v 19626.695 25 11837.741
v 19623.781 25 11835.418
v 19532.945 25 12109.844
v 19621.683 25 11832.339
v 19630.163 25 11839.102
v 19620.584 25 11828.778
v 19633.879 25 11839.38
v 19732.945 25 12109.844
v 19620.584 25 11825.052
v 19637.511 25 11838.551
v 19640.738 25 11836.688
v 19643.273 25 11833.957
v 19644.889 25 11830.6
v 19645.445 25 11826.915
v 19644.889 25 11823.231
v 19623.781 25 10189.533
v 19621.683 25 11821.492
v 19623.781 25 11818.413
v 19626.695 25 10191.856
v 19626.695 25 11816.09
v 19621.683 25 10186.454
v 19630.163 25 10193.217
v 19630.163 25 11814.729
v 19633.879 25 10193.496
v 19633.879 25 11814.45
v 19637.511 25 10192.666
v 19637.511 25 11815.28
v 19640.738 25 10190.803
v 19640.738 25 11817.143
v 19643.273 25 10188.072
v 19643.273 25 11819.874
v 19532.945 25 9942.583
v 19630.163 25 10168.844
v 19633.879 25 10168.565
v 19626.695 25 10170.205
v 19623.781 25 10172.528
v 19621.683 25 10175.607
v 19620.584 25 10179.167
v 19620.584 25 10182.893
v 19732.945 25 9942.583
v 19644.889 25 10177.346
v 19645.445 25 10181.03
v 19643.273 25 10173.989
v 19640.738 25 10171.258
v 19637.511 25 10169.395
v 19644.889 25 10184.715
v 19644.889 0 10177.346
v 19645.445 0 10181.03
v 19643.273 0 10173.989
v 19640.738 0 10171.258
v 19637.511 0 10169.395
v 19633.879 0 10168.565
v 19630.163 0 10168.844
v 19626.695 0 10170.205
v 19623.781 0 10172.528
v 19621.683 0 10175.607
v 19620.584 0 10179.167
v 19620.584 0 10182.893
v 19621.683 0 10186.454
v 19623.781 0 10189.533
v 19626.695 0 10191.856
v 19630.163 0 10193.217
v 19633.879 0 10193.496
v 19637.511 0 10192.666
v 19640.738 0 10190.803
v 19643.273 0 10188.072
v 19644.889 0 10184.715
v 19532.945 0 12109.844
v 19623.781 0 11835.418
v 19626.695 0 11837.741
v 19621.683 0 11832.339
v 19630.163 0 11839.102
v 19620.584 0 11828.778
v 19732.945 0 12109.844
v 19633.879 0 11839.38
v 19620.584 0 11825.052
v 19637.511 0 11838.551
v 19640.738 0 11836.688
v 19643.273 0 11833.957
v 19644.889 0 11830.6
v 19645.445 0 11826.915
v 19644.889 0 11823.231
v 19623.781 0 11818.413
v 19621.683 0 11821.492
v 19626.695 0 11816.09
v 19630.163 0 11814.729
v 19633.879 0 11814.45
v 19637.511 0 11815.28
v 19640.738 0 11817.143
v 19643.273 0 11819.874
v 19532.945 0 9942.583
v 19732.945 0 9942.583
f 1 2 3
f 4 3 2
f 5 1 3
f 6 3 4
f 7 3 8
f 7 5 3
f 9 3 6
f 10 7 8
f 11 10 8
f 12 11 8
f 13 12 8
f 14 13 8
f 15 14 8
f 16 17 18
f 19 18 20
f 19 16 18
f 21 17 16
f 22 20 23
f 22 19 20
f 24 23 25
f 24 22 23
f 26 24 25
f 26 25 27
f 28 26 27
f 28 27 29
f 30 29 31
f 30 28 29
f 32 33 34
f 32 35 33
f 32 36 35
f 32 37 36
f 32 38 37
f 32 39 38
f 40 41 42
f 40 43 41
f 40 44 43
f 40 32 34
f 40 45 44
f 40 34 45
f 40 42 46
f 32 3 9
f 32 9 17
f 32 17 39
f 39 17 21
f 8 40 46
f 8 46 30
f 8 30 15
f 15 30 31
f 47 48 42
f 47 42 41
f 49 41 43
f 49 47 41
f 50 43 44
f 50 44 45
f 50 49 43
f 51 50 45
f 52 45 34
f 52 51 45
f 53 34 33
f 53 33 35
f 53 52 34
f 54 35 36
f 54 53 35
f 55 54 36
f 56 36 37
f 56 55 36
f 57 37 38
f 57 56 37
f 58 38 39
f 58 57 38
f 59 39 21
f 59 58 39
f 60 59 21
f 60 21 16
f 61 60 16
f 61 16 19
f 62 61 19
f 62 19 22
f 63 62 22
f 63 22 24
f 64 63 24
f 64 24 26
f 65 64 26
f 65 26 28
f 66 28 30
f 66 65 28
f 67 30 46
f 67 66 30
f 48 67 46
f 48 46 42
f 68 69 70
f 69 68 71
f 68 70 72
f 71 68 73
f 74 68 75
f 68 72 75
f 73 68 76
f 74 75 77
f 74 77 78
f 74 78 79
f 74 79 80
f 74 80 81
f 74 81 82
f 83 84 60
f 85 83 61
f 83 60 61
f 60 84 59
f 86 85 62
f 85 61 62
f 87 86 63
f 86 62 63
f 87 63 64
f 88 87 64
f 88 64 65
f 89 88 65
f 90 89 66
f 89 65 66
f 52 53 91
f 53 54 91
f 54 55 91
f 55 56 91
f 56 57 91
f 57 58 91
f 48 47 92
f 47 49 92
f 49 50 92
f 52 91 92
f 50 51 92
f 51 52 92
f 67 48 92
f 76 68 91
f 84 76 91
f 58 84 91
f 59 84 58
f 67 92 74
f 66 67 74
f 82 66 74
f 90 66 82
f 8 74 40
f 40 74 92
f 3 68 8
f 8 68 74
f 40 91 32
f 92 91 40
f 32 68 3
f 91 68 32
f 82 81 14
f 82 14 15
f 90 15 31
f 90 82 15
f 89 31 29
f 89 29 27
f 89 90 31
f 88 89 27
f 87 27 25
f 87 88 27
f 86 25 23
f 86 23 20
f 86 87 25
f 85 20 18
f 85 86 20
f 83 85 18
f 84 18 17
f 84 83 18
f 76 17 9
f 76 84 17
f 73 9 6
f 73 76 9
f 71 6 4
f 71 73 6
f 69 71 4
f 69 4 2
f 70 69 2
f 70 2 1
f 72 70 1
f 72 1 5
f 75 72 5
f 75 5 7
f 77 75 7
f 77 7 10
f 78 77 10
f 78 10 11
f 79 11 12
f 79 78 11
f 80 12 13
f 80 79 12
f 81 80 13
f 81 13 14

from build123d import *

# Parameters (mm, degrees)
SKETCH4_W             = 200
SKETCH4_H             = 2933.573874127
SKETCH4_R             = 12.5
BOSS_EXTRUDE1_DEPTH   = 25
SKETCH4_H_2           = 2891.000919938
BOSS_EXTRUDE1_2_DEPTH = 25
SKETCH4_H_3           = 2656.8496719
BOSS_EXTRUDE1_3_DEPTH = 25
SKETCH4_H_4           = 2167.26069873
BOSS_EXTRUDE1_4_DEPTH = 25
SKETCH4_H_5           = 1693.636583381
BOSS_EXTRUDE1_5_DEPTH = 25
SKETCH5_W             = 1339.509446366
SKETCH5_H             = 4935.034802403
SKETCH5_W_2           = 4846.909180931
SKETCH5_H_2           = 7014.799469129
SKETCH5_W_3           = 493.50348024
SKETCH5_H_3           = 881.256214715
CUT_EXTRUDE1_DEPTH    = 26


with BuildPart() as part:
    # Sketch4 → Boss-Extrude1 (new body)
    with BuildSketch(Plane(origin=(0, 0, 0), x_dir=(1, 0, 0), z_dir=(0, 1, 0))):
        with Locations((23132.944645813, -11409.369811035)):
            Rectangle(SKETCH4_W, SKETCH4_H)
        with Locations((23132.944645813, -12678.089615367)):
            Circle(SKETCH4_R, mode=Mode.SUBTRACT)
        with Locations((23132.944645813, -10181.030459334)):
            Circle(SKETCH4_R, mode=Mode.SUBTRACT)
    extrude(amount=BOSS_EXTRUDE1_DEPTH)


with BuildPart() as body_2:
    # Sketch4 → Boss-Extrude1 2 (new body)
    with BuildSketch(Plane(origin=(0, 0, 0), x_dir=(1, 0, 0), z_dir=(0, 1, 0))):
        with Locations((22032.944645813, -11388.083333941)):
            Rectangle(SKETCH4_W, SKETCH4_H_2)
        with Locations((22032.944645813, -12621.228285175)):
            Circle(SKETCH4_R, mode=Mode.SUBTRACT)
        with Locations((22032.944645813, -10181.030459334)):
            Circle(SKETCH4_R, mode=Mode.SUBTRACT)
    extrude(amount=BOSS_EXTRUDE1_2_DEPTH)


with BuildPart() as body_3:
    # Sketch4 → Boss-Extrude1 3 (new body)
    with BuildSketch(Plane(origin=(0, 0, 0), x_dir=(1, 0, 0), z_dir=(0, 1, 0))):
        with Locations((20832.944645813, -11271.007709922)):
            Rectangle(SKETCH4_W, SKETCH4_H_3)
        with Locations((20832.944645813, -12348.754240871)):
            Circle(SKETCH4_R, mode=Mode.SUBTRACT)
        with Locations((20832.944645813, -10181.030459334)):
            Circle(SKETCH4_R, mode=Mode.SUBTRACT)
    extrude(amount=BOSS_EXTRUDE1_3_DEPTH)


with BuildPart() as body_4:
    # Sketch4 → Boss-Extrude1 4 (new body)
    with BuildSketch(Plane(origin=(0, 0, 0), x_dir=(1, 0, 0), z_dir=(0, 1, 0))):
        with Locations((19632.944645813, -11026.213223337)):
            Rectangle(SKETCH4_W, SKETCH4_H_4)
        with Locations((19632.944645813, -11826.915448153)):
            Circle(SKETCH4_R, mode=Mode.SUBTRACT)
        with Locations((19632.944645813, -10181.030459334)):
            Circle(SKETCH4_R, mode=Mode.SUBTRACT)
    extrude(amount=BOSS_EXTRUDE1_4_DEPTH)


with BuildPart() as body_5:
    # Sketch4 → Boss-Extrude1 5 (new body)
    with BuildSketch(Plane(origin=(0, 0, 0), x_dir=(1, 0, 0), z_dir=(0, 1, 0))):
        with Locations((18802.944645813, -10789.401165663)):
            Rectangle(SKETCH4_W, SKETCH4_H_5)
        with Locations((18802.944645813, -11283.669778774)):
            Circle(SKETCH4_R, mode=Mode.SUBTRACT)
        with Locations((18802.944645813, -10181.030459334)):
            Circle(SKETCH4_R, mode=Mode.SUBTRACT)
    extrude(amount=BOSS_EXTRUDE1_5_DEPTH)


with BuildPart() as cut_extrude1_tool:
    # Sketch5 → Cut-Extrude1 (new body, through all)
    with BuildSketch(Plane(origin=(0, 0, 0), x_dir=(1, 0, 0), z_dir=(0, 1, 0))):
        with Locations((18465.176996023, -10818.928147177)):
            Rectangle(SKETCH5_W, SKETCH5_H)
        with Locations((22474.892772976, -10995.17939012)):
            Rectangle(SKETCH5_W_2, SKETCH5_H_2)
        with Locations((20474.441165573, -13427.446542733)):
            Rectangle(SKETCH5_W_3, SKETCH5_H_3, mode=Mode.SUBTRACT)
    extrude(amount=CUT_EXTRUDE1_DEPTH)


with BuildPart() as part_1:
    add(part.part)

    # Cut-Extrude1: cut by cut_extrude1_tool
    add(cut_extrude1_tool.part, mode=Mode.SUBTRACT)


with BuildPart() as body_2_1:
    add(body_2.part)

    # Cut-Extrude1: cut by cut_extrude1_tool
    add(cut_extrude1_tool.part, mode=Mode.SUBTRACT)


with BuildPart() as body_3_1:
    add(body_3.part)

    # Cut-Extrude1: cut by cut_extrude1_tool
    add(cut_extrude1_tool.part, mode=Mode.SUBTRACT)


with BuildPart() as body_5_1:
    add(body_5.part)

    # Cut-Extrude1: cut by cut_extrude1_tool
    add(cut_extrude1_tool.part, mode=Mode.SUBTRACT)


solid = body_4.part
